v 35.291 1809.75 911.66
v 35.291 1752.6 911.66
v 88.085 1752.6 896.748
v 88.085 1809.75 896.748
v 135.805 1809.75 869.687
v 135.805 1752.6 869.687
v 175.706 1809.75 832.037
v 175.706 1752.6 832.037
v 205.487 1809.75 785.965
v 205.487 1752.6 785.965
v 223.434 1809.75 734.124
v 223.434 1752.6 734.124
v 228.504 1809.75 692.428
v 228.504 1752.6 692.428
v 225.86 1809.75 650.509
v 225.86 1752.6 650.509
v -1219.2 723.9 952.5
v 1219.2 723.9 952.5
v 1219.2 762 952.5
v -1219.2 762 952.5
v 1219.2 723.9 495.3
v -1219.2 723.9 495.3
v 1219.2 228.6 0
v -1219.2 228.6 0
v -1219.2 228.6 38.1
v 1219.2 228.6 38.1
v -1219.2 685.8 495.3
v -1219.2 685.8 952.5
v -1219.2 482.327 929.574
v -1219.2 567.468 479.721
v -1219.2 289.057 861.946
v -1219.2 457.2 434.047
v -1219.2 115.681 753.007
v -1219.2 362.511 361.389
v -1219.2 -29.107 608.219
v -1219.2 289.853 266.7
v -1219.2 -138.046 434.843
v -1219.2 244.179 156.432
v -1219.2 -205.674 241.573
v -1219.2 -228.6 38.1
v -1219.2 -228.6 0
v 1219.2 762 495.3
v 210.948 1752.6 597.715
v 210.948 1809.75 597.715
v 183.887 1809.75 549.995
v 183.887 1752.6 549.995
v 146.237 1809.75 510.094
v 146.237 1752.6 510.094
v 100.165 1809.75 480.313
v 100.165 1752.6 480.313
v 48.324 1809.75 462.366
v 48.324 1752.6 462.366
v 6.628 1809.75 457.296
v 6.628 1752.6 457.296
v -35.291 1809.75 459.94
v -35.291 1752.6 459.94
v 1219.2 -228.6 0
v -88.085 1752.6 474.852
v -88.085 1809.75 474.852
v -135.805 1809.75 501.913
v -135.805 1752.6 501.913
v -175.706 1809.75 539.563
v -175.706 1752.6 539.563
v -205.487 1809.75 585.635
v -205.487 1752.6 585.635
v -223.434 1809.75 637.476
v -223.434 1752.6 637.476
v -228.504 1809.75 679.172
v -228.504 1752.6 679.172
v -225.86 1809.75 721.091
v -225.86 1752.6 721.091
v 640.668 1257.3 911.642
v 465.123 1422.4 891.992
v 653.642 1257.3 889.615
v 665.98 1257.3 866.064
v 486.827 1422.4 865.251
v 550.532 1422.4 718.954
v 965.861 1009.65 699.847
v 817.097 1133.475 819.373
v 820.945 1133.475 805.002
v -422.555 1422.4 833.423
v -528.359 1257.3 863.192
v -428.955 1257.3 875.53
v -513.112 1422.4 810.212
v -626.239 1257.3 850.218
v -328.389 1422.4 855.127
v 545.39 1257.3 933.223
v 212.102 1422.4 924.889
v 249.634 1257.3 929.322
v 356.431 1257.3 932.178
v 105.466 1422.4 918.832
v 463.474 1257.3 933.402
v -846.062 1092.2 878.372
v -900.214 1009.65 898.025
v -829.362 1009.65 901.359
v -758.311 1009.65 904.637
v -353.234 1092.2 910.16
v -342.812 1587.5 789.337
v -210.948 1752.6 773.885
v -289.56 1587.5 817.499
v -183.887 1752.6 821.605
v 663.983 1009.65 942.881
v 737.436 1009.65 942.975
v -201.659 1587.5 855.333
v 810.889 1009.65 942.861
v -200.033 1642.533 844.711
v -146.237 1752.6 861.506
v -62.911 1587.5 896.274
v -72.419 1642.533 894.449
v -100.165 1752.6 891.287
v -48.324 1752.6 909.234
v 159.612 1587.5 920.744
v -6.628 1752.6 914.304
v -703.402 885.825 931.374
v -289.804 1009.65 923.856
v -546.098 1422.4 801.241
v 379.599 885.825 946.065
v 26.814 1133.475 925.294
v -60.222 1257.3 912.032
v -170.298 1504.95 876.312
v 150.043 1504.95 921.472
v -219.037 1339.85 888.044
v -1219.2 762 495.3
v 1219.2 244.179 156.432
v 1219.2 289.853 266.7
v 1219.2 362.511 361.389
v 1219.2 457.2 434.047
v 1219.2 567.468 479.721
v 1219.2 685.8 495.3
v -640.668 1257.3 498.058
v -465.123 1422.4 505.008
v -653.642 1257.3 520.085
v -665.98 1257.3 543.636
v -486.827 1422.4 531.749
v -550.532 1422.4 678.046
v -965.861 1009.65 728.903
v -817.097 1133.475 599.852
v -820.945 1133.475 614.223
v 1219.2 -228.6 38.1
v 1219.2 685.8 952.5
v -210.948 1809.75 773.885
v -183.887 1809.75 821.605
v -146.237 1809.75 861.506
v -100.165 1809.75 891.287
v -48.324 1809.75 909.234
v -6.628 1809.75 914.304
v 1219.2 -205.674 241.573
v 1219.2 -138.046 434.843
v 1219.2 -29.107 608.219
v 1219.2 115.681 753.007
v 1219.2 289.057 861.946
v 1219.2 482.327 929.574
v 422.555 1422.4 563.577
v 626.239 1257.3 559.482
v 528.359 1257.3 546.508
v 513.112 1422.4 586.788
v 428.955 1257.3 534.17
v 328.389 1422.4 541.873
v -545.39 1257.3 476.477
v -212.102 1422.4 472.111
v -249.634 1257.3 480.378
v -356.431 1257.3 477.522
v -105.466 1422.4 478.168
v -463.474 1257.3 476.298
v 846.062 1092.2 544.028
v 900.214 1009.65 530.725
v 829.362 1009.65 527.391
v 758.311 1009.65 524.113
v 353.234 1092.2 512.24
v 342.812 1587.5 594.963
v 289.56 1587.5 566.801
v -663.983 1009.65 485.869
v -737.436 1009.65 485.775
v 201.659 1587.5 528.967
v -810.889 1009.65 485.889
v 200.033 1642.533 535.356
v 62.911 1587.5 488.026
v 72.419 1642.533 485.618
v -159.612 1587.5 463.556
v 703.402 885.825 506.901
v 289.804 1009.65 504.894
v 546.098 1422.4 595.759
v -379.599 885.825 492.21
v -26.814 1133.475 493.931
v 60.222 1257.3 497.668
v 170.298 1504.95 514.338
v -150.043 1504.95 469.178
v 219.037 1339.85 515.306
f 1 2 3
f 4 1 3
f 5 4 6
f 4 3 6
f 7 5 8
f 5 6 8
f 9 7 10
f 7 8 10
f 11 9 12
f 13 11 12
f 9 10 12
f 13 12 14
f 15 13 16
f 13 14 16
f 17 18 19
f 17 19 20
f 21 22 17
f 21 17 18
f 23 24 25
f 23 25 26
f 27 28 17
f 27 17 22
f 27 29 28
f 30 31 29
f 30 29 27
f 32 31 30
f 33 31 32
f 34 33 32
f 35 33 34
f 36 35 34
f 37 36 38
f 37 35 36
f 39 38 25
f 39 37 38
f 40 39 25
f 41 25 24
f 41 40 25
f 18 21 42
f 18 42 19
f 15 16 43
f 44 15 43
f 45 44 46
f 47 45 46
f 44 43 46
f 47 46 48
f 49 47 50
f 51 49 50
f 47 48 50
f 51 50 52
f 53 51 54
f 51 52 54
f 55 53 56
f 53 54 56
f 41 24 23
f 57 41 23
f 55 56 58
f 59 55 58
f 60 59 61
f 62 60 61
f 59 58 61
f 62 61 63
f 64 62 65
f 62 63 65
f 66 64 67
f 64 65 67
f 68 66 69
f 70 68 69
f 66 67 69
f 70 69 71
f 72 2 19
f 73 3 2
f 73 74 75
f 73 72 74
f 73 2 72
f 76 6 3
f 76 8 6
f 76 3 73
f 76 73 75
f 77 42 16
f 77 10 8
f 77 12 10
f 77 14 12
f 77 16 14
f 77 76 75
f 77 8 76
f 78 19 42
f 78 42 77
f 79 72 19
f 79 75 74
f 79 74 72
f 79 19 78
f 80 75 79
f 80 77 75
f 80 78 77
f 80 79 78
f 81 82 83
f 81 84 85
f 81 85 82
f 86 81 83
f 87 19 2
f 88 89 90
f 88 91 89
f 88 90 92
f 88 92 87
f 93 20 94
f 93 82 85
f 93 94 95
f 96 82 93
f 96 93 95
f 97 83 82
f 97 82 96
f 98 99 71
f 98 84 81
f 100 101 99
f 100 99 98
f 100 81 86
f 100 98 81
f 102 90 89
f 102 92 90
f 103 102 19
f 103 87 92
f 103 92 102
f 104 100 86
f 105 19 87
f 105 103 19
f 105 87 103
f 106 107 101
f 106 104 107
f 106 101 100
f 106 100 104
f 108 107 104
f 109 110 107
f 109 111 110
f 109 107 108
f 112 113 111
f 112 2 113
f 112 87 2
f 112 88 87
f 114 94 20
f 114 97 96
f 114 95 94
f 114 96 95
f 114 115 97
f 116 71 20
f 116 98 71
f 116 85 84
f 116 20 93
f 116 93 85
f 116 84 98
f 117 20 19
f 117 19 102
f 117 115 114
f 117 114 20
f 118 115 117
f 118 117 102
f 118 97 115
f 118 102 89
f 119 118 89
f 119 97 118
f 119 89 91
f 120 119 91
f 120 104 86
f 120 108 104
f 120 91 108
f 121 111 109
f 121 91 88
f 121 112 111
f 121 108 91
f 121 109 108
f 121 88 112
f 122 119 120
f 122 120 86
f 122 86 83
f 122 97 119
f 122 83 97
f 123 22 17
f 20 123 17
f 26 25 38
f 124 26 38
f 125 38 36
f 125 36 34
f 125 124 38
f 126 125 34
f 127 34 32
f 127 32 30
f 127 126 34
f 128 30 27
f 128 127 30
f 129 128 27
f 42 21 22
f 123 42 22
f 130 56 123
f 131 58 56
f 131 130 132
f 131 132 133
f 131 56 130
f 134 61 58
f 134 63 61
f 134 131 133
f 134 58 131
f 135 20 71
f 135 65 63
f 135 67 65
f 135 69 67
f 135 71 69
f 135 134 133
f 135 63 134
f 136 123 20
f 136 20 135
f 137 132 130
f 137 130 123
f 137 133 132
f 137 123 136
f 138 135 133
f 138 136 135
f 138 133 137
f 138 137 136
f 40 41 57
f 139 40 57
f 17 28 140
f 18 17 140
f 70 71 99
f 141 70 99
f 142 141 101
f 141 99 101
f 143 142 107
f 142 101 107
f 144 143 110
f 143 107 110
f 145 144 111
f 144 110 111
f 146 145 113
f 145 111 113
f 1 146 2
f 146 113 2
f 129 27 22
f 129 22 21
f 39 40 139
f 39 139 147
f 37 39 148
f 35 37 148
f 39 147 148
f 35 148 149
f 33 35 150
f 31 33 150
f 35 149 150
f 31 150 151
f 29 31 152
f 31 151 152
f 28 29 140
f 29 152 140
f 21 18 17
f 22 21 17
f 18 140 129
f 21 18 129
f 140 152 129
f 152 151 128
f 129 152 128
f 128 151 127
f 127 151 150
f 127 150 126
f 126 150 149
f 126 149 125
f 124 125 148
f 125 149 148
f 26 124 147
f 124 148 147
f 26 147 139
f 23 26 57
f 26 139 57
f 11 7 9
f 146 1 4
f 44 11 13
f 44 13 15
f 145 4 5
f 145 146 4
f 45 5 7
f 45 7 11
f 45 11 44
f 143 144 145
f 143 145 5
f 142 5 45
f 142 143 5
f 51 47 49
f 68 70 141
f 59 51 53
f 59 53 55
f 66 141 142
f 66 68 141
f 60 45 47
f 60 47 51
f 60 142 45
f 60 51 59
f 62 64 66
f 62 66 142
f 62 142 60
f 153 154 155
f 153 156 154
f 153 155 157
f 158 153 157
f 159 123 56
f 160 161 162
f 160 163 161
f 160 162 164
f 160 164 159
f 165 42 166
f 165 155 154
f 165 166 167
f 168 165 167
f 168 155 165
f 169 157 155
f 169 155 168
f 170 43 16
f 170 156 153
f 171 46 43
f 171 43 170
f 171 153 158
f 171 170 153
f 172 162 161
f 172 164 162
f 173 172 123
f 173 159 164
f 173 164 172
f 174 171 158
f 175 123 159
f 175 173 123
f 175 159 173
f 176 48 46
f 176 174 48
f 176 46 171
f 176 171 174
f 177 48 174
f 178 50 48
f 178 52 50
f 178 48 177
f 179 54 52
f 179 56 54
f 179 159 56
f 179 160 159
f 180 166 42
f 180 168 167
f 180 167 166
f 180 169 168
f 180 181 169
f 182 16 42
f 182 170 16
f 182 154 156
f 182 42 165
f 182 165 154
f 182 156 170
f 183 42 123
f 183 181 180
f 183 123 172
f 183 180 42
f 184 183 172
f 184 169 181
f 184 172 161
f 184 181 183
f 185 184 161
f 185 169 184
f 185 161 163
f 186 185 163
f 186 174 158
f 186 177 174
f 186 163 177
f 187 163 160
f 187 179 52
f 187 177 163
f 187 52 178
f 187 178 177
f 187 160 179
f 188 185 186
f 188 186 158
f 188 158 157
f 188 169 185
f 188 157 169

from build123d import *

# Parameters (mm, degrees)
F0_W      = 2438.4
F0_H      = 457.2
F1_DEPTH  = 38.1
F2_W      = 2438.4
F2_H      = 457.2
F3_ANGLE  = 90
F4_DEPTH  = 38.1
F5_W      = 2438.4
F5_H      = 457.2
F6_DEPTH  = 38.1
F6_FACE_W = 2438.4
F6_FACE_H = 457.2
F10_DEPTH = 57.15


# Not quite as in the source:
# - the arcs of a loft's sections are written as splines that run evenly, so that the points pair up as in the source's solid


with BuildPart() as f1:
    # F0 (on Top) → F1 (new body)
    with BuildSketch(Plane.XY):
        Rectangle(F0_W, F0_H)
    extrude(amount=F1_DEPTH)

    # F2 (on face) → F3 (revolve)
    with BuildSketch(Plane.XY.offset(38.1)):
        Rectangle(F2_W, F2_H)
    revolve(axis=Axis((-103.2055318356, 685.8, 38.1), (-1, 0, 0)), revolution_arc=F3_ANGLE)

    # F4 (add): a face of the model
    f4_faces = [f1.faces().sort_by_distance(p)[0] for p in [
        (0, 685.8, 723.9),
    ]]
    extrude(f4_faces, amount=F4_DEPTH)


with BuildPart() as f6:
    # F5 (on face) → F6 (new body)
    with BuildSketch(Plane(origin=(0, 723.9, 0), x_dir=(-1, 0, 0), z_dir=(0, 1, 0))):
        with Locations((0, 723.9)):
            Rectangle(F5_W, F5_H)
    extrude(amount=F6_DEPTH)

    # F6_face (on face) → F9 section 0
    with BuildSketch(Plane(origin=(0, 762, 723.9), x_dir=(-1, 0, 0), z_dir=(0, 1, 0))):
        Rectangle(F6_FACE_W, F6_FACE_H)
    # F8 (on offset) → F9 section 1
    with BuildSketch(Plane(origin=(0, 1752.6, 0), x_dir=(-1, 0, 0), z_dir=(0, 1, 0))):
        with BuildLine():
            add(Edge.make_bspline(
                [(-225.8595509155, 650.5094451695), (-223.5497895031, 635.7269721299), (-219.7841746904, 621.1723506338), (-209.4855798503, 593.076710899), (-202.952854476, 579.5363873802), (-187.3709568448, 553.9897536684), (-178.3221698812, 541.9840751662), (-158.0557730466, 519.9681902843), (-146.8386643022, 509.9585282907), (-122.6665945289, 492.3194503481), (-109.7122312021, 484.69047056), (-82.5634075757, 472.1060594298), (-68.3696185843, 467.1509392621), (-39.2873551715, 460.1048068067), (-24.3995998664, 458.0139687485), (5.4984882594, 456.7768938866), (20.508081791, 457.6306876721), (35.2905548305, 459.9404490845)],
                knots=[0, 0, 0, 0, 0.125, 0.125, 0.25, 0.25, 0.375, 0.375, 0.5, 0.5, 0.625, 0.625, 0.75, 0.75, 0.875, 0.875, 1, 1, 1, 1], degree=3))
            add(Edge.make_bspline(
                [(35.2905548305, 459.9404490845), (50.0730278701, 462.2502104969), (64.6276493662, 466.0158253096), (92.723289101, 476.3144201497), (106.2636126198, 482.847145524), (131.8102463316, 498.4290431552), (143.8159248338, 507.4778301188), (165.8318097157, 527.7442269534), (175.8414717093, 538.9613356978), (193.4805496519, 563.1334054711), (201.10952944, 576.0877687979), (213.6939405702, 603.2365924243), (218.6490607379, 617.4303814157), (225.6951931933, 646.5126448285), (227.7860312515, 661.4004001336), (229.0231061134, 691.2984882594), (228.1693123279, 706.308081791), (225.8595509155, 721.0905548305)],
                knots=[0, 0, 0, 0, 0.125, 0.125, 0.25, 0.25, 0.375, 0.375, 0.5, 0.5, 0.625, 0.625, 0.75, 0.75, 0.875, 0.875, 1, 1, 1, 1], degree=3))
            add(Edge.make_bspline(
                [(225.8595509155, 721.0905548305), (223.5497895031, 735.8730278701), (219.7841746904, 750.4276493662), (209.4855798503, 778.523289101), (202.952854476, 792.0636126198), (187.3709568448, 817.6102463316), (178.3221698812, 829.6159248338), (158.0557730466, 851.6318097157), (146.8386643022, 861.6414717093), (122.6665945289, 879.2805496519), (109.7122312021, 886.90952944), (82.5634075757, 899.4939405702), (68.3696185843, 904.4490607379), (39.2873551715, 911.4951931933), (24.3995998664, 913.5860312515), (-5.4984882594, 914.8231061134), (-20.508081791, 913.9693123279), (-35.2905548305, 911.6595509155)],
                knots=[0, 0, 0, 0, 0.125, 0.125, 0.25, 0.25, 0.375, 0.375, 0.5, 0.5, 0.625, 0.625, 0.75, 0.75, 0.875, 0.875, 1, 1, 1, 1], degree=3))
            add(Edge.make_bspline(
                [(-35.2905548305, 911.6595509155), (-50.0730278701, 909.3497895031), (-64.6276493662, 905.5841746904), (-92.723289101, 895.2855798503), (-106.2636126198, 888.752854476), (-131.8102463316, 873.1709568448), (-143.8159248338, 864.1221698812), (-165.8318097157, 843.8557730466), (-175.8414717093, 832.6386643022), (-193.4805496519, 808.4665945289), (-201.10952944, 795.5122312021), (-213.6939405702, 768.3634075757), (-218.6490607379, 754.1696185843), (-225.6951931933, 725.0873551715), (-227.7860312515, 710.1995998664), (-229.0231061134, 680.3015117406), (-228.1693123279, 665.291918209), (-225.8595509155, 650.5094451695)],
                knots=[0, 0, 0, 0, 0.125, 0.125, 0.25, 0.25, 0.375, 0.375, 0.5, 0.5, 0.625, 0.625, 0.75, 0.75, 0.875, 0.875, 1, 1, 1, 1], degree=3))
        make_face()
    loft(ruled=True)

    # F10 (add): a face of the model
    f10_faces = [f6.faces().sort_by_distance(p)[0] for p in [
        (0, 1752.6, 685.8),
    ]]
    extrude(f10_faces, amount=F10_DEPTH)


solid = Compound([f1.part, f6.part])
